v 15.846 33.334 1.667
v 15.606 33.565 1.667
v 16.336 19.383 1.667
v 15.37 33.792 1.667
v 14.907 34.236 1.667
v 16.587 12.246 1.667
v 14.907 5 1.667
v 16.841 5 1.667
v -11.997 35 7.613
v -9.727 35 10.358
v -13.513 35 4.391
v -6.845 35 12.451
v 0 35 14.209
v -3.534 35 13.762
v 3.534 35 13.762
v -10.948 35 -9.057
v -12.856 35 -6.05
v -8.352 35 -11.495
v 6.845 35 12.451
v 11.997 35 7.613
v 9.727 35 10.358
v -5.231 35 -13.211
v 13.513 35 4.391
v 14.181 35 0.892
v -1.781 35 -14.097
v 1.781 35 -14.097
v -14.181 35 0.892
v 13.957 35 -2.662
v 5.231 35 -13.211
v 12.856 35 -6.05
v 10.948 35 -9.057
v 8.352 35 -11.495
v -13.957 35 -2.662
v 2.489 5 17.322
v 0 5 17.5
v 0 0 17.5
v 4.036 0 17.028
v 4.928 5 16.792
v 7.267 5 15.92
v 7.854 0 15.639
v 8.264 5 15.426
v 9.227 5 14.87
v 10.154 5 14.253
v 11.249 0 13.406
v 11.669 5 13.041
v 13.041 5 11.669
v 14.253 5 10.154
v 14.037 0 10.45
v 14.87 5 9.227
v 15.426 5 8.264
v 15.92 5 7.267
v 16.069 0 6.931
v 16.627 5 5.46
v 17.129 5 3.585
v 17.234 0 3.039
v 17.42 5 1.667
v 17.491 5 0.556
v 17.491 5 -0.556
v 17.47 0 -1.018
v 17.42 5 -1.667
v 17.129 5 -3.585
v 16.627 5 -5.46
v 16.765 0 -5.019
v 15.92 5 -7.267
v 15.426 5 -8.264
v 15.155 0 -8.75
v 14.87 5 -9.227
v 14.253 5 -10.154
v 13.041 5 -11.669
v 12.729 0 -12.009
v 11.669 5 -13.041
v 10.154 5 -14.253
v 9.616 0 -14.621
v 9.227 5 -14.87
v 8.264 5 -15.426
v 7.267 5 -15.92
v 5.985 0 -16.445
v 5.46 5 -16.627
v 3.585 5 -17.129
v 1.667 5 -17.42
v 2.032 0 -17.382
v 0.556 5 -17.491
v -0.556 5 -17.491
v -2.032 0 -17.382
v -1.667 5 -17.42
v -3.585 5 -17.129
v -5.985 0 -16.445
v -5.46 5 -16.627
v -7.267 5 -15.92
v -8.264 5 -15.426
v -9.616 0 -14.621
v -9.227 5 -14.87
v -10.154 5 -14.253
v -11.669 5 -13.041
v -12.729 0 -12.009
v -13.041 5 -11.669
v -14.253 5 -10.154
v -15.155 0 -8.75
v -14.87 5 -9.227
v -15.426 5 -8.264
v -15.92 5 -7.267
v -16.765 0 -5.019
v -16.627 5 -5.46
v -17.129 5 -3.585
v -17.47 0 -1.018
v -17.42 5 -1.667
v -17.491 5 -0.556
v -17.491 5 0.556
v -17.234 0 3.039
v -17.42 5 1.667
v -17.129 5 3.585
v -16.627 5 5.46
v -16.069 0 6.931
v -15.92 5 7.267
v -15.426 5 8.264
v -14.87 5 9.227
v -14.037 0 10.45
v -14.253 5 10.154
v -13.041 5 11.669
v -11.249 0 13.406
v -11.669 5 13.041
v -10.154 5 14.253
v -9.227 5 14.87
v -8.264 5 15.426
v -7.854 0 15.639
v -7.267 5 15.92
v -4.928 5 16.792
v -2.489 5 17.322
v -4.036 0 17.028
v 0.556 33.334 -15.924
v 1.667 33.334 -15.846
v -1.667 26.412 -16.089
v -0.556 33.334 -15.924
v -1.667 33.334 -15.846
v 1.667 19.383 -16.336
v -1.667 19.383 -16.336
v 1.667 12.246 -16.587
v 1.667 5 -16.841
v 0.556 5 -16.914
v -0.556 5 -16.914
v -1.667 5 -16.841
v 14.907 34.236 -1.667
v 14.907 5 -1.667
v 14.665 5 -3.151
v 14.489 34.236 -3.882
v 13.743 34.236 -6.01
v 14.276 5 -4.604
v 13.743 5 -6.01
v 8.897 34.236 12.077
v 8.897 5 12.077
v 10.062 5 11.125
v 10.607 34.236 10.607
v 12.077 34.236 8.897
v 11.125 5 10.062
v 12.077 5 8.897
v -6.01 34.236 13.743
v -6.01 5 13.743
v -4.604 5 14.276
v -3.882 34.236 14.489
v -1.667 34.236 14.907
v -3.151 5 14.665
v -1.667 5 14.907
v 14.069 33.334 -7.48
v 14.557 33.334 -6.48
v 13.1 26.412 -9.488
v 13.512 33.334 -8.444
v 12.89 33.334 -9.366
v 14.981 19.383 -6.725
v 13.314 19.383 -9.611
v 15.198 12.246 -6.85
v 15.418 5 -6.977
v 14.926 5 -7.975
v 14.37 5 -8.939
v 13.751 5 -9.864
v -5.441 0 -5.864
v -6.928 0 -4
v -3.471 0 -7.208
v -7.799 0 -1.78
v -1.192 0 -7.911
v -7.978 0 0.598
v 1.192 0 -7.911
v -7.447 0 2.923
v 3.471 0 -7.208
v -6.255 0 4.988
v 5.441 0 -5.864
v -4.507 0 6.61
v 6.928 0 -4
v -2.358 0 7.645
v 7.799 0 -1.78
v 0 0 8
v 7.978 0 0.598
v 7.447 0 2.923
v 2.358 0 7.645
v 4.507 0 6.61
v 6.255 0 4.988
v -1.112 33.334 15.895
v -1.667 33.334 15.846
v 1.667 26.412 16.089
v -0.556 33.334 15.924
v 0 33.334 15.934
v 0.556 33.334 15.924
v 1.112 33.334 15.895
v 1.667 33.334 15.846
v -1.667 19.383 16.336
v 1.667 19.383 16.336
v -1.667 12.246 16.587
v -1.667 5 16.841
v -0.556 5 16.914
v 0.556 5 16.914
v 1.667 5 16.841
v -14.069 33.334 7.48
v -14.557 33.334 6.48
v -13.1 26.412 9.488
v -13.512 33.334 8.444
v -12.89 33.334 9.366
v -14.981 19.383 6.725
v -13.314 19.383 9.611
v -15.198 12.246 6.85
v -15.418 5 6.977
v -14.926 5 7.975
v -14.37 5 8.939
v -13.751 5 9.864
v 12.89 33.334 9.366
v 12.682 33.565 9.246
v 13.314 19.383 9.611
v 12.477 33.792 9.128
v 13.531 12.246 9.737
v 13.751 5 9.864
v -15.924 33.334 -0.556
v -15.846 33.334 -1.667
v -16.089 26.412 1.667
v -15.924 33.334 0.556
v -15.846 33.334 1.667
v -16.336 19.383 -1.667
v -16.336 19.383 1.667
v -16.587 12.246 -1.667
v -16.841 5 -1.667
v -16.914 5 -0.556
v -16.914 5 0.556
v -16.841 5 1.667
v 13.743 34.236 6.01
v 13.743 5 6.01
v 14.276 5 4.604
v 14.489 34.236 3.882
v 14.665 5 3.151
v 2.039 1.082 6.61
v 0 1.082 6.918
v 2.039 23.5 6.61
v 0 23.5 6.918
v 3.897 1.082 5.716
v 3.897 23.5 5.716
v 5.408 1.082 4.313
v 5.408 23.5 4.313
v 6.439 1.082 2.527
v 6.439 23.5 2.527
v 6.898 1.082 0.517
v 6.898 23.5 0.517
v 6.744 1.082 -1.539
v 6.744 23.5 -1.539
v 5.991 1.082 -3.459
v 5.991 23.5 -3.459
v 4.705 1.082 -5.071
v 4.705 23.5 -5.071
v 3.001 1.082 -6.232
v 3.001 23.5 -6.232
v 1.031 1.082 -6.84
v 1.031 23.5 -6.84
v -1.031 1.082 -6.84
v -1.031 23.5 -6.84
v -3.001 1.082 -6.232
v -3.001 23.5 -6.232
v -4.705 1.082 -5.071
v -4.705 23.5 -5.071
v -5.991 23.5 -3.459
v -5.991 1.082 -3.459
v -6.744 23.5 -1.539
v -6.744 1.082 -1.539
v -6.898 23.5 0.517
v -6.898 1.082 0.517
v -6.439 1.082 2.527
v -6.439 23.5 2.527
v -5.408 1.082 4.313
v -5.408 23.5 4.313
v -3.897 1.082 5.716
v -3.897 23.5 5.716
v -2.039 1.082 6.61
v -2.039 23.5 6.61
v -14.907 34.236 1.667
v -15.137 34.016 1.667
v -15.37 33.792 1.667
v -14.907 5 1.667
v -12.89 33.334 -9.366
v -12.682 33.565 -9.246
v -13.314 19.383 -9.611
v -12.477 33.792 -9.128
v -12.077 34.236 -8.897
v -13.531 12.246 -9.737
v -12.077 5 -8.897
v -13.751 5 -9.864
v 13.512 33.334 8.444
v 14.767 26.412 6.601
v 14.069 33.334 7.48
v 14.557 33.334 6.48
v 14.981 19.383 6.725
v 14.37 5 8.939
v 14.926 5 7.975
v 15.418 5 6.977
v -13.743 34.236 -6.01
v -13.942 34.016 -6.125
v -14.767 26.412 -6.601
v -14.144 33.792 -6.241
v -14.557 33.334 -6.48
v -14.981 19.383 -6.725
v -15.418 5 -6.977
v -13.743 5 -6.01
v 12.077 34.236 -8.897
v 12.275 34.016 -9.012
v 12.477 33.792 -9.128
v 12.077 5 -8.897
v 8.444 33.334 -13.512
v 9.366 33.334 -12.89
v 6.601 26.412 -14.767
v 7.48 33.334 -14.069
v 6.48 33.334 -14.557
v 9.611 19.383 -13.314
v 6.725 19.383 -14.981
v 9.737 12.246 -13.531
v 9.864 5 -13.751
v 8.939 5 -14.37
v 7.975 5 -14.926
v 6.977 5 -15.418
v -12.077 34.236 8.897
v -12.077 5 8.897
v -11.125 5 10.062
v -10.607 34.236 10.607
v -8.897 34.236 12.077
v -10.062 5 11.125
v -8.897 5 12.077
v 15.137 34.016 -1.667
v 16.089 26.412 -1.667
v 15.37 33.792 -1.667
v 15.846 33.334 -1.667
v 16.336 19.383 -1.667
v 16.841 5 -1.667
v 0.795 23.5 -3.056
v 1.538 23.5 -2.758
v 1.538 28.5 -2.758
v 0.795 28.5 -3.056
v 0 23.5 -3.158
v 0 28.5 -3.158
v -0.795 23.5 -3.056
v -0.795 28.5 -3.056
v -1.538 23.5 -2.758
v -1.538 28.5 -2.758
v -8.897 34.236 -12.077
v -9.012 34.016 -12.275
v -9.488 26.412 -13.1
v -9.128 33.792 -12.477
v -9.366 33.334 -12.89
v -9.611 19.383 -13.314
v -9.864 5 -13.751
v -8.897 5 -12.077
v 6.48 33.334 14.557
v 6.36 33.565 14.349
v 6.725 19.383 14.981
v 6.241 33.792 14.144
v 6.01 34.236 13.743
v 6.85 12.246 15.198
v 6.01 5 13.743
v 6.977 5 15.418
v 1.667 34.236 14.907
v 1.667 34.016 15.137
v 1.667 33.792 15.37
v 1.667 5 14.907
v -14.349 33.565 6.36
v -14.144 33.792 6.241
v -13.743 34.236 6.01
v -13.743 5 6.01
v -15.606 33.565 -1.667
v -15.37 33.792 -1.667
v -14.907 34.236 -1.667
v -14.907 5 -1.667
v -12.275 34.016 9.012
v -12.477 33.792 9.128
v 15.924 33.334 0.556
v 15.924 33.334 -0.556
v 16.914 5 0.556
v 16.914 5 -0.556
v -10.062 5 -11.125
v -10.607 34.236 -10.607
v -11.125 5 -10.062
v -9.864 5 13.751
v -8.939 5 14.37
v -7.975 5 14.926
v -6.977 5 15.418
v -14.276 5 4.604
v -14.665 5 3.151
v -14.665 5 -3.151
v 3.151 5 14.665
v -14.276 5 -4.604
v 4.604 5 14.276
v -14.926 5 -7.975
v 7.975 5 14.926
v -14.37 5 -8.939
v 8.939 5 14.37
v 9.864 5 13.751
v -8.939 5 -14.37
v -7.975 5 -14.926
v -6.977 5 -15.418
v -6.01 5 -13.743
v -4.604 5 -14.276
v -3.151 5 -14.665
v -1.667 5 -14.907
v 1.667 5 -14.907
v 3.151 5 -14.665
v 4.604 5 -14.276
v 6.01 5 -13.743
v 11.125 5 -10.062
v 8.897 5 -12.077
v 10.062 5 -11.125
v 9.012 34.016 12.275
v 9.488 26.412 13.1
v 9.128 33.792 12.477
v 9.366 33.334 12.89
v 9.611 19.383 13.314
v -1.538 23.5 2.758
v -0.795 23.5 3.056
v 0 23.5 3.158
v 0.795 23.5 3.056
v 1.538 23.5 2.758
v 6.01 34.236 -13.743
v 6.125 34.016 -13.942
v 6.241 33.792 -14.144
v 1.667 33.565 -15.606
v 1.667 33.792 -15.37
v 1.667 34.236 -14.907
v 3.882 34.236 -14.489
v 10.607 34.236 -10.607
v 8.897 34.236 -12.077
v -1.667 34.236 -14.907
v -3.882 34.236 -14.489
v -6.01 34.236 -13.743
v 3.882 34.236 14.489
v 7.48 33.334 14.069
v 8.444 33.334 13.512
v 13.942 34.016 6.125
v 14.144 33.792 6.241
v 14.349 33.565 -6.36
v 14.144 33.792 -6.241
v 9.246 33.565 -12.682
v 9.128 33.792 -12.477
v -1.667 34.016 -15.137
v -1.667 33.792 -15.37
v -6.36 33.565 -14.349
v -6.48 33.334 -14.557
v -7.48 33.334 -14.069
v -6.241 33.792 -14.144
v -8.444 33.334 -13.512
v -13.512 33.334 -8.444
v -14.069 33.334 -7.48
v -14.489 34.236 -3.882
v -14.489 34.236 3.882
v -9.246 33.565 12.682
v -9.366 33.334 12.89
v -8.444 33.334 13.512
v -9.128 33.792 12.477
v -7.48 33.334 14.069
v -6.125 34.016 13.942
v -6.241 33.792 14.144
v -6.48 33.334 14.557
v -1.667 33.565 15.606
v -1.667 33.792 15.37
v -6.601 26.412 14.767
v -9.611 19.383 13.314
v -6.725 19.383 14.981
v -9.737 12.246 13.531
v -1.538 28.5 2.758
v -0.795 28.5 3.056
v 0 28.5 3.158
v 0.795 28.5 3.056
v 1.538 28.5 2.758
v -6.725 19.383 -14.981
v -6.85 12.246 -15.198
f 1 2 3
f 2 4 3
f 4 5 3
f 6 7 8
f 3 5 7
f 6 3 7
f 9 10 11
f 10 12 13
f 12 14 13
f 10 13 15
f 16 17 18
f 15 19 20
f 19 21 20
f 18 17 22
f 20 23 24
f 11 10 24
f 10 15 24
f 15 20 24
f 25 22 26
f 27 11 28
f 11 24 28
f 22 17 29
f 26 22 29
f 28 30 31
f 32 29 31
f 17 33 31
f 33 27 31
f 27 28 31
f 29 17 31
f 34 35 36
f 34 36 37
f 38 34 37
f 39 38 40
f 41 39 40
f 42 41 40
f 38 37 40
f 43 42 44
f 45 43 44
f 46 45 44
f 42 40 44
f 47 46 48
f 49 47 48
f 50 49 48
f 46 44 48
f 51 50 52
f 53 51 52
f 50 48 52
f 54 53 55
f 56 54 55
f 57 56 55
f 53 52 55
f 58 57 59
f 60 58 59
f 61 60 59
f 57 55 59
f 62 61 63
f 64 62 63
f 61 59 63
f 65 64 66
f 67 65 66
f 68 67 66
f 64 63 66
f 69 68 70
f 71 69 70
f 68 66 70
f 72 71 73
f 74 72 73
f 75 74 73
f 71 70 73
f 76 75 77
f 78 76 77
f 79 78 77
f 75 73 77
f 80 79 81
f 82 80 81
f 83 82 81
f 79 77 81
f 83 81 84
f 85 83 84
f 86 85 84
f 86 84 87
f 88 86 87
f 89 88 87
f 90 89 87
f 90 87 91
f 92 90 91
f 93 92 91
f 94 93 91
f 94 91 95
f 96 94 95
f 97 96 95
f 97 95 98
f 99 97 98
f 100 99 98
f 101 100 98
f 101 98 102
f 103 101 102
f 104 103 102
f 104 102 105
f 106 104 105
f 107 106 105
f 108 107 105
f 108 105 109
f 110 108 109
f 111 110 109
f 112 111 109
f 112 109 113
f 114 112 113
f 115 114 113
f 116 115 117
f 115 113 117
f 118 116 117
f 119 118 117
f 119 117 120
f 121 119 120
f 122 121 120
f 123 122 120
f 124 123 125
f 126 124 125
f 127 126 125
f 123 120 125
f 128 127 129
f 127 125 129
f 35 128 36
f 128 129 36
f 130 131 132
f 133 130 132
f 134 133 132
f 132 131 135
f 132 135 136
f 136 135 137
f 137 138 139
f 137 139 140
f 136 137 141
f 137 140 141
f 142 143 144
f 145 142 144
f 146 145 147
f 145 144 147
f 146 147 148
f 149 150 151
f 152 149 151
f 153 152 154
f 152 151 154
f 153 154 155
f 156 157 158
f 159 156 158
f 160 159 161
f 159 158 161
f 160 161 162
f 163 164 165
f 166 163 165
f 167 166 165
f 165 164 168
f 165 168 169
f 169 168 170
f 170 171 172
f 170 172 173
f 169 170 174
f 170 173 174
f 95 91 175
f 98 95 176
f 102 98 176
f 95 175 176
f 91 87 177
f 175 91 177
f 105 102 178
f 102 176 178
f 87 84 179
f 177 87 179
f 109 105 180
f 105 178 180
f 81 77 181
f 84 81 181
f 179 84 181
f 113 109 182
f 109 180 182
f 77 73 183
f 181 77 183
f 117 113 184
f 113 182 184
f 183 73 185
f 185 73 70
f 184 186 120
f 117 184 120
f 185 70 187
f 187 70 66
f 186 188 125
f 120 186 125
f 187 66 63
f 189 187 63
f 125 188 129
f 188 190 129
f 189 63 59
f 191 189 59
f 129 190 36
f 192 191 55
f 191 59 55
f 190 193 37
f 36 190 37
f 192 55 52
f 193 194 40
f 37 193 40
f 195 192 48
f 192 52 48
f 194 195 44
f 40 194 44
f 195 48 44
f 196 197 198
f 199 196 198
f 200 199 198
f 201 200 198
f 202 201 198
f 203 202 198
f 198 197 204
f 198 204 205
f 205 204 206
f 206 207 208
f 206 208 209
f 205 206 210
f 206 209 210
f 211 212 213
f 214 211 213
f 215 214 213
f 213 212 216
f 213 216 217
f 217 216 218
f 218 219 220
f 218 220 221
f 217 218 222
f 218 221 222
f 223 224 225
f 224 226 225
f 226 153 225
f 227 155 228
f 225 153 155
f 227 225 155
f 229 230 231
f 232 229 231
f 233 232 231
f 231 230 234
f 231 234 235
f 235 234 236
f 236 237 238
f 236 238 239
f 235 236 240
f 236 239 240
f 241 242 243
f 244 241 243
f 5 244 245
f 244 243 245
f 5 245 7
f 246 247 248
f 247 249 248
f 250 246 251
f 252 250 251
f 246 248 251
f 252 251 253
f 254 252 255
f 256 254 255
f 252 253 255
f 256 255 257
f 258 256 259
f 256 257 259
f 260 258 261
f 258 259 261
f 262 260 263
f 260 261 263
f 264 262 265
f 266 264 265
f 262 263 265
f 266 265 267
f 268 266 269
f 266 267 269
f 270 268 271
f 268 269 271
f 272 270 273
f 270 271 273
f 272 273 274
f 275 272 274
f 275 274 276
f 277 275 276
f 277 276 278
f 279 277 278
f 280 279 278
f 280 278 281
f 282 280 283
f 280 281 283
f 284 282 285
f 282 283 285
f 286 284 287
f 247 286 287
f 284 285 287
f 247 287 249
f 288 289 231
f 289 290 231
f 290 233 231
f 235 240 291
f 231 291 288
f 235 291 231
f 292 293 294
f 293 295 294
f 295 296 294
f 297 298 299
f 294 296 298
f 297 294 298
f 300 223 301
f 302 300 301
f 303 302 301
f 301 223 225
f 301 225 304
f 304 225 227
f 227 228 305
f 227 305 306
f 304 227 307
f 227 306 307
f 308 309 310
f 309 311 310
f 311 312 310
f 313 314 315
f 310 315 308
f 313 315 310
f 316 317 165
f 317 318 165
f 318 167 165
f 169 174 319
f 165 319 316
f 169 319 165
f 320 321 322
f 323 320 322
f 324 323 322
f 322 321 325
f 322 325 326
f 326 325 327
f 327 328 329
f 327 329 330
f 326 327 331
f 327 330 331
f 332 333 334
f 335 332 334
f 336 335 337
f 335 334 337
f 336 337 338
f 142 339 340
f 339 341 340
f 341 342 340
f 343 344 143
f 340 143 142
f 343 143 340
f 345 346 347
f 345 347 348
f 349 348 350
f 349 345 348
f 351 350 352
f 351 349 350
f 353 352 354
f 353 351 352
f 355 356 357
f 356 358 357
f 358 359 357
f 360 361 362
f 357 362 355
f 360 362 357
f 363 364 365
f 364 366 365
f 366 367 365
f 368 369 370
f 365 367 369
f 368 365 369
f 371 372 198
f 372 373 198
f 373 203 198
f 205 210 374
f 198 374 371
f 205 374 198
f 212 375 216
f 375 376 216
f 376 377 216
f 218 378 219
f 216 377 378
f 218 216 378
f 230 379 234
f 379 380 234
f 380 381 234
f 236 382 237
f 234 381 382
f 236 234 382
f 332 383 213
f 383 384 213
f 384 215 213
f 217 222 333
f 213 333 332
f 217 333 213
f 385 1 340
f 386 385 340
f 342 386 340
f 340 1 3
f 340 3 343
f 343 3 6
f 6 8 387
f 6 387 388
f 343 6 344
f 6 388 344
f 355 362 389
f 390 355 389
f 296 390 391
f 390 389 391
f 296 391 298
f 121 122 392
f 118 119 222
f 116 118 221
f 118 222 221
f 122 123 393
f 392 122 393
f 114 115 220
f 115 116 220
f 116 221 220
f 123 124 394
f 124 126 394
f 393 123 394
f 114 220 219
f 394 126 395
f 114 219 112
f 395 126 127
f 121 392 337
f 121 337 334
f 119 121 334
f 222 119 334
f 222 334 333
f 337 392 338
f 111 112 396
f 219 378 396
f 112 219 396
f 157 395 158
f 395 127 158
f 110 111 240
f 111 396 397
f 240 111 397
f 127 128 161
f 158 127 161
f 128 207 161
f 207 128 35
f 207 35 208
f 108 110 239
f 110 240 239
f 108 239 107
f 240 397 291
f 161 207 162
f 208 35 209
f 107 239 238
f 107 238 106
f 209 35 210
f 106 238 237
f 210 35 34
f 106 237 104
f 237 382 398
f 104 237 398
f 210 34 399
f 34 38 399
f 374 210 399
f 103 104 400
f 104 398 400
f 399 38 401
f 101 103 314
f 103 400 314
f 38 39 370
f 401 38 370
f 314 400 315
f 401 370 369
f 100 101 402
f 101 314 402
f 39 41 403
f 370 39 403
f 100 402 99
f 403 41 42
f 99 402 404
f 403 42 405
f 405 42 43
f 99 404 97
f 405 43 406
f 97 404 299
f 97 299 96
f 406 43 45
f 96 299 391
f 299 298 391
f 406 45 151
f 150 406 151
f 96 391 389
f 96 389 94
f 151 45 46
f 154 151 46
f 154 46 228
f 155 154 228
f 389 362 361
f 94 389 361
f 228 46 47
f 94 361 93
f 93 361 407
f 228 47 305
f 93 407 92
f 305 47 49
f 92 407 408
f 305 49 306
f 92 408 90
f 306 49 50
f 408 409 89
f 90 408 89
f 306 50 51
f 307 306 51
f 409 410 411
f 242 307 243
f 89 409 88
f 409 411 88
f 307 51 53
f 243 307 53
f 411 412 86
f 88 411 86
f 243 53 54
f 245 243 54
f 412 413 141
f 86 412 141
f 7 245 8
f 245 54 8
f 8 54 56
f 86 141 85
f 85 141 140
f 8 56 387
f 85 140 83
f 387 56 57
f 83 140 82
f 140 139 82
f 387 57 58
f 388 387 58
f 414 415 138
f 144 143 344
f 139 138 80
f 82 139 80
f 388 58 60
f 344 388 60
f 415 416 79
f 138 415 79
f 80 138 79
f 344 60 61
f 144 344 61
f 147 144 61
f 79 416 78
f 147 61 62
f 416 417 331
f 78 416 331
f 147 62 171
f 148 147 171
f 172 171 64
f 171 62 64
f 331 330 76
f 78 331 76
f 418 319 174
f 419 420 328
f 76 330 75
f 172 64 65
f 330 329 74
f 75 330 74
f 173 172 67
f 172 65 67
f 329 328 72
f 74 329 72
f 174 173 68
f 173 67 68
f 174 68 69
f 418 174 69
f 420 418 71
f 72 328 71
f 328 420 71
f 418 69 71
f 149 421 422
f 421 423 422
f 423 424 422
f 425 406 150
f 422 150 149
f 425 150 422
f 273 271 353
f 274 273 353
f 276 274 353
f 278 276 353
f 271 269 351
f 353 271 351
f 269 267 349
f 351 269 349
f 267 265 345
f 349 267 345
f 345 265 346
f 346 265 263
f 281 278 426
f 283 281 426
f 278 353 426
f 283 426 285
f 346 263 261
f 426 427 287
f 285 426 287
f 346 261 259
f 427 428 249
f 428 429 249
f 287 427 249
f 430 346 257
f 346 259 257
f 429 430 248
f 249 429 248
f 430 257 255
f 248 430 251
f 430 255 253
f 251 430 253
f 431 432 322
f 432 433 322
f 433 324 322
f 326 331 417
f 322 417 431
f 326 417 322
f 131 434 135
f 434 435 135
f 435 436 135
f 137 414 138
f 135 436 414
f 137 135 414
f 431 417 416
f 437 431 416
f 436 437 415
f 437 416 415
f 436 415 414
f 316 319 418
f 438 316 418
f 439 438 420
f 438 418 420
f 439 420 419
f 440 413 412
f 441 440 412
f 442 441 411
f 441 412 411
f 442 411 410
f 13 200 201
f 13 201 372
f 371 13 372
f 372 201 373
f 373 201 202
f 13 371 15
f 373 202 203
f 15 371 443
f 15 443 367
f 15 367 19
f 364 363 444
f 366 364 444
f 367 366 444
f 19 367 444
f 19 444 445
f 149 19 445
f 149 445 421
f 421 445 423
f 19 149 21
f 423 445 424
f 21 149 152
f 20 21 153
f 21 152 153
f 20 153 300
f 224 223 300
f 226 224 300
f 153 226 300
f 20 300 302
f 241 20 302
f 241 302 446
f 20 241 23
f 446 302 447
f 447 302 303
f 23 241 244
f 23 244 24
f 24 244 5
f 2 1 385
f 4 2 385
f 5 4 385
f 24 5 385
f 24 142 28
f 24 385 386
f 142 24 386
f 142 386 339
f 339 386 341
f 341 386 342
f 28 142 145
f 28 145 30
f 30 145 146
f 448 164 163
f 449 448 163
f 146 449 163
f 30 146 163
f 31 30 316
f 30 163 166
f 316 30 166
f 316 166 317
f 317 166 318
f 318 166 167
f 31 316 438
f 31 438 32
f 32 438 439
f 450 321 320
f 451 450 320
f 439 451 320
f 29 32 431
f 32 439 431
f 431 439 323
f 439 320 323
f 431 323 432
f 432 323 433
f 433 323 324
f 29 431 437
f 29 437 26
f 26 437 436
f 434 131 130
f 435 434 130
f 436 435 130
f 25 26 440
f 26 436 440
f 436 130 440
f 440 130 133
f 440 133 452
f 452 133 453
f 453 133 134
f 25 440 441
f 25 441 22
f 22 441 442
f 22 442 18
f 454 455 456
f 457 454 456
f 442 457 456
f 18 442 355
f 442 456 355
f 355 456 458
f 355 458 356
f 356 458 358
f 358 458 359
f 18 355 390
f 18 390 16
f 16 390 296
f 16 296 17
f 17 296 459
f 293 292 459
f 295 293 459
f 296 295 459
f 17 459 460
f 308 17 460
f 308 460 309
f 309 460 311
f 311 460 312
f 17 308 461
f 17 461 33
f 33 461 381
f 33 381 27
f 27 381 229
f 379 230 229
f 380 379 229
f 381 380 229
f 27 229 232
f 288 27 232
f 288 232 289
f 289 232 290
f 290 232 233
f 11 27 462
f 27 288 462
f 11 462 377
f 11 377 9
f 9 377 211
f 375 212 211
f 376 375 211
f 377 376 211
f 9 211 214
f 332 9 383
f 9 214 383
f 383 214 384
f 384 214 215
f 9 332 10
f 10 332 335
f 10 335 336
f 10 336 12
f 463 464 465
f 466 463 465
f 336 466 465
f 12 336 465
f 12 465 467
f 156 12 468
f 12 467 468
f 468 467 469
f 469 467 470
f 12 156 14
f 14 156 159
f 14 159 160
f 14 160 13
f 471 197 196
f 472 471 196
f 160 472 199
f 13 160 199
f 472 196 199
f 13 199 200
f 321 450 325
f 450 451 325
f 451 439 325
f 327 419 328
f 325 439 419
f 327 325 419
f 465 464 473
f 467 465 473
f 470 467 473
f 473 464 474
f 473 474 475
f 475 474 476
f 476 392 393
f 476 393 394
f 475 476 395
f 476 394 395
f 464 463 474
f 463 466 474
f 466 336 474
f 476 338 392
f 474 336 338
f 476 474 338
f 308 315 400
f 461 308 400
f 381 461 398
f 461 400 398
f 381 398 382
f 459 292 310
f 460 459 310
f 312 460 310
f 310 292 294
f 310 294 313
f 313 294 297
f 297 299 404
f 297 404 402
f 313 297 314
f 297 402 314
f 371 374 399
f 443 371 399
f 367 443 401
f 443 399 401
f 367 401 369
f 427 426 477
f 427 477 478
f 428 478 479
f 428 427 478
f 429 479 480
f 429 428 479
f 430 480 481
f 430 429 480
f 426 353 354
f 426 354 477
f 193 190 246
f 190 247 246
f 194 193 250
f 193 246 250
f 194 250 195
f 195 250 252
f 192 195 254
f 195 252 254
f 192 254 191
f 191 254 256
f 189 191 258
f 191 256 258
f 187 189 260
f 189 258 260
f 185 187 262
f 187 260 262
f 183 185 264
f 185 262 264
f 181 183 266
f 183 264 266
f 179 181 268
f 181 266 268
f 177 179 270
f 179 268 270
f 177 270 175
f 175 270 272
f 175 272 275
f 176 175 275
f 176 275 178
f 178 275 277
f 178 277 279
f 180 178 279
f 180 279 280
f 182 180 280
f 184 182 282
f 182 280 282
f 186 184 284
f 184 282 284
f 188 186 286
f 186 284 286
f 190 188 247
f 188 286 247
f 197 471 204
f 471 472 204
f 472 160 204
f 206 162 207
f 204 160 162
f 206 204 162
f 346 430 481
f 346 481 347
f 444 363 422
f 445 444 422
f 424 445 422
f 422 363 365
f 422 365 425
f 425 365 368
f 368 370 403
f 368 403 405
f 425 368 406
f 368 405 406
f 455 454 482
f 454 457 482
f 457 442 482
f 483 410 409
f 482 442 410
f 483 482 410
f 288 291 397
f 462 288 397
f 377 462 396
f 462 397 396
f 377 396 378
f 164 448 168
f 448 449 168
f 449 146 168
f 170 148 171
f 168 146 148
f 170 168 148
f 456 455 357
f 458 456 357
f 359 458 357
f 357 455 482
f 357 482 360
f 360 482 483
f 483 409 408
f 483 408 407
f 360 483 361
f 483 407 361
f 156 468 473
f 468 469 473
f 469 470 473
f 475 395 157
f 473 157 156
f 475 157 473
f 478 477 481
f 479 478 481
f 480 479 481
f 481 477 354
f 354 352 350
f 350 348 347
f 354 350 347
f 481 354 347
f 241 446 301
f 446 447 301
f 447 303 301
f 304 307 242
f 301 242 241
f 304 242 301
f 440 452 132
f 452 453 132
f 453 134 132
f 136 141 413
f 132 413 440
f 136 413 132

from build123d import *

# Parameters (mm, degrees)
CUT_EXTRUDE_START   = -30
SKETCH_2_R          = 23.333333333
CUT_EXTRUDE_1_DEPTH = 30
CUT_EXTRUDE_2_DEPTH = 5


with BuildPart() as part:
    # 草图1 → 旋转1 (revolve)
    with BuildSketch(Plane.XY):
        Polygon((0, 35), (14.208787172, 35), (15.933619666, 33.334348622), (16.923076923, 5), (17.5, 5), (17.5, 0), (8, 0), (6.9175, 1.0825), (6.9175, 23.5), (0, 23.5), align=None)
    revolve(axis=Axis((0, 0, 0), (0, 1, 0)))

    # 草图2 → 切除-拉伸1 (cut)
    with BuildSketch(Plane(origin=(0, 35, 0), x_dir=(1, 0, 0), z_dir=(0, 1, 0)).offset(CUT_EXTRUDE_START)):
        Circle(SKETCH_2_R)
        with BuildLine():
            Line((-17.420454134, -1.666666667), (-14.90711985, -1.666666667))
            ThreePointArc((-14.90711985, -1.666666667), (-14.488887394, -3.882285677), (-13.743277821, -6.010184252))
            Line((-13.743277821, -6.010184252), (-15.919889159, -7.266851394))
            ThreePointArc((-15.919889159, -7.266851394), (-15.155444566, -8.75), (-14.253222492, -10.15360274))
            Line((-14.253222492, -10.15360274), (-12.076611154, -8.896935598))
            ThreePointArc((-12.076611154, -8.896935598), (-10.606601718, -10.606601718), (-8.896935598, -12.076611154))
            Line((-8.896935598, -12.076611154), (-10.15360274, -14.253222492))
            ThreePointArc((-10.15360274, -14.253222492), (-8.75, -15.155444566), (-7.266851394, -15.919889159))
            Line((-7.266851394, -15.919889159), (-6.010184252, -13.743277821))
            ThreePointArc((-6.010184252, -13.743277821), (-3.882285677, -14.488887394), (-1.666666667, -14.90711985))
            Line((-1.666666667, -14.90711985), (-1.666666667, -17.420454134))
            ThreePointArc((-1.666666667, -17.420454134), (0, -17.5), (1.666666667, -17.420454134))
            Line((1.666666667, -17.420454134), (1.666666667, -14.90711985))
            ThreePointArc((1.666666667, -14.90711985), (3.882285677, -14.488887394), (6.010184252, -13.743277821))
            Line((6.010184252, -13.743277821), (7.266851394, -15.919889159))
            ThreePointArc((7.266851394, -15.919889159), (8.75, -15.155444566), (10.15360274, -14.253222492))
            Line((10.15360274, -14.253222492), (8.896935598, -12.076611154))
            ThreePointArc((8.896935598, -12.076611154), (10.606601718, -10.606601718), (12.076611154, -8.896935598))
            Line((12.076611154, -8.896935598), (14.253222492, -10.15360274))
            ThreePointArc((14.253222492, -10.15360274), (15.155444566, -8.75), (15.919889159, -7.266851394))
            Line((15.919889159, -7.266851394), (13.743277821, -6.010184252))
            ThreePointArc((13.743277821, -6.010184252), (14.488887394, -3.882285677), (14.90711985, -1.666666667))
            Line((14.90711985, -1.666666667), (17.420454134, -1.666666667))
            ThreePointArc((17.420454134, -1.666666667), (17.5, 0), (17.420454134, 1.666666667))
            Line((17.420454134, 1.666666667), (14.90711985, 1.666666667))
            ThreePointArc((14.90711985, 1.666666667), (14.488887394, 3.882285677), (13.743277821, 6.010184252))
            Line((13.743277821, 6.010184252), (15.919889159, 7.266851394))
            ThreePointArc((15.919889159, 7.266851394), (15.155444566, 8.75), (14.253222492, 10.15360274))
            Line((14.253222492, 10.15360274), (12.076611154, 8.896935598))
            ThreePointArc((12.076611154, 8.896935598), (10.606601718, 10.606601718), (8.896935598, 12.076611154))
            Line((8.896935598, 12.076611154), (10.15360274, 14.253222492))
            ThreePointArc((10.15360274, 14.253222492), (8.75, 15.155444566), (7.266851394, 15.919889159))
            Line((7.266851394, 15.919889159), (6.010184252, 13.743277821))
            ThreePointArc((6.010184252, 13.743277821), (3.882285677, 14.488887394), (1.666666667, 14.90711985))
            Line((1.666666667, 14.90711985), (1.666666667, 17.420454134))
            ThreePointArc((1.666666667, 17.420454134), (0, 17.5), (-1.666666667, 17.420454134))
            Line((-1.666666667, 17.420454134), (-1.666666667, 14.90711985))
            ThreePointArc((-1.666666667, 14.90711985), (-3.882285677, 14.488887394), (-6.010184252, 13.743277821))
            Line((-6.010184252, 13.743277821), (-7.266851394, 15.919889159))
            ThreePointArc((-7.266851394, 15.919889159), (-8.75, 15.155444566), (-10.15360274, 14.253222492))
            Line((-10.15360274, 14.253222492), (-8.896935598, 12.076611154))
            ThreePointArc((-8.896935598, 12.076611154), (-10.606601718, 10.606601718), (-12.076611154, 8.896935598))
            Line((-12.076611154, 8.896935598), (-14.253222492, 10.15360274))
            ThreePointArc((-14.253222492, 10.15360274), (-15.155444566, 8.75), (-15.919889159, 7.266851394))
            Line((-15.919889159, 7.266851394), (-13.743277821, 6.010184252))
            ThreePointArc((-13.743277821, 6.010184252), (-14.488887394, 3.882285677), (-14.90711985, 1.666666667))
            Line((-14.90711985, 1.666666667), (-17.420454134, 1.666666667))
            ThreePointArc((-17.420454134, 1.666666667), (-17.5, 0), (-17.420454134, -1.666666667))
        make_face(mode=Mode.SUBTRACT)
    extrude(amount=CUT_EXTRUDE_1_DEPTH, mode=Mode.SUBTRACT)

    # 草图3 → 切除-拉伸2 (cut)
    with BuildSketch(Plane(origin=(0, 23.5, 0), x_dir=(1, 0, 0), z_dir=(0, 1, 0))):
        with BuildLine():
            Line((1.538461538, -2.757795363), (1.538461538, 2.757795363))
            ThreePointArc((1.538461538, 2.757795363), (0, 3.157894737), (-1.538461538, 2.757795363))
            Line((-1.538461538, 2.757795363), (-1.538461538, -2.757795363))
            ThreePointArc((-1.538461538, -2.757795363), (0, -3.157894737), (1.538461538, -2.757795363))
        make_face()
    extrude(amount=CUT_EXTRUDE_2_DEPTH, mode=Mode.SUBTRACT)


solid = part.part
